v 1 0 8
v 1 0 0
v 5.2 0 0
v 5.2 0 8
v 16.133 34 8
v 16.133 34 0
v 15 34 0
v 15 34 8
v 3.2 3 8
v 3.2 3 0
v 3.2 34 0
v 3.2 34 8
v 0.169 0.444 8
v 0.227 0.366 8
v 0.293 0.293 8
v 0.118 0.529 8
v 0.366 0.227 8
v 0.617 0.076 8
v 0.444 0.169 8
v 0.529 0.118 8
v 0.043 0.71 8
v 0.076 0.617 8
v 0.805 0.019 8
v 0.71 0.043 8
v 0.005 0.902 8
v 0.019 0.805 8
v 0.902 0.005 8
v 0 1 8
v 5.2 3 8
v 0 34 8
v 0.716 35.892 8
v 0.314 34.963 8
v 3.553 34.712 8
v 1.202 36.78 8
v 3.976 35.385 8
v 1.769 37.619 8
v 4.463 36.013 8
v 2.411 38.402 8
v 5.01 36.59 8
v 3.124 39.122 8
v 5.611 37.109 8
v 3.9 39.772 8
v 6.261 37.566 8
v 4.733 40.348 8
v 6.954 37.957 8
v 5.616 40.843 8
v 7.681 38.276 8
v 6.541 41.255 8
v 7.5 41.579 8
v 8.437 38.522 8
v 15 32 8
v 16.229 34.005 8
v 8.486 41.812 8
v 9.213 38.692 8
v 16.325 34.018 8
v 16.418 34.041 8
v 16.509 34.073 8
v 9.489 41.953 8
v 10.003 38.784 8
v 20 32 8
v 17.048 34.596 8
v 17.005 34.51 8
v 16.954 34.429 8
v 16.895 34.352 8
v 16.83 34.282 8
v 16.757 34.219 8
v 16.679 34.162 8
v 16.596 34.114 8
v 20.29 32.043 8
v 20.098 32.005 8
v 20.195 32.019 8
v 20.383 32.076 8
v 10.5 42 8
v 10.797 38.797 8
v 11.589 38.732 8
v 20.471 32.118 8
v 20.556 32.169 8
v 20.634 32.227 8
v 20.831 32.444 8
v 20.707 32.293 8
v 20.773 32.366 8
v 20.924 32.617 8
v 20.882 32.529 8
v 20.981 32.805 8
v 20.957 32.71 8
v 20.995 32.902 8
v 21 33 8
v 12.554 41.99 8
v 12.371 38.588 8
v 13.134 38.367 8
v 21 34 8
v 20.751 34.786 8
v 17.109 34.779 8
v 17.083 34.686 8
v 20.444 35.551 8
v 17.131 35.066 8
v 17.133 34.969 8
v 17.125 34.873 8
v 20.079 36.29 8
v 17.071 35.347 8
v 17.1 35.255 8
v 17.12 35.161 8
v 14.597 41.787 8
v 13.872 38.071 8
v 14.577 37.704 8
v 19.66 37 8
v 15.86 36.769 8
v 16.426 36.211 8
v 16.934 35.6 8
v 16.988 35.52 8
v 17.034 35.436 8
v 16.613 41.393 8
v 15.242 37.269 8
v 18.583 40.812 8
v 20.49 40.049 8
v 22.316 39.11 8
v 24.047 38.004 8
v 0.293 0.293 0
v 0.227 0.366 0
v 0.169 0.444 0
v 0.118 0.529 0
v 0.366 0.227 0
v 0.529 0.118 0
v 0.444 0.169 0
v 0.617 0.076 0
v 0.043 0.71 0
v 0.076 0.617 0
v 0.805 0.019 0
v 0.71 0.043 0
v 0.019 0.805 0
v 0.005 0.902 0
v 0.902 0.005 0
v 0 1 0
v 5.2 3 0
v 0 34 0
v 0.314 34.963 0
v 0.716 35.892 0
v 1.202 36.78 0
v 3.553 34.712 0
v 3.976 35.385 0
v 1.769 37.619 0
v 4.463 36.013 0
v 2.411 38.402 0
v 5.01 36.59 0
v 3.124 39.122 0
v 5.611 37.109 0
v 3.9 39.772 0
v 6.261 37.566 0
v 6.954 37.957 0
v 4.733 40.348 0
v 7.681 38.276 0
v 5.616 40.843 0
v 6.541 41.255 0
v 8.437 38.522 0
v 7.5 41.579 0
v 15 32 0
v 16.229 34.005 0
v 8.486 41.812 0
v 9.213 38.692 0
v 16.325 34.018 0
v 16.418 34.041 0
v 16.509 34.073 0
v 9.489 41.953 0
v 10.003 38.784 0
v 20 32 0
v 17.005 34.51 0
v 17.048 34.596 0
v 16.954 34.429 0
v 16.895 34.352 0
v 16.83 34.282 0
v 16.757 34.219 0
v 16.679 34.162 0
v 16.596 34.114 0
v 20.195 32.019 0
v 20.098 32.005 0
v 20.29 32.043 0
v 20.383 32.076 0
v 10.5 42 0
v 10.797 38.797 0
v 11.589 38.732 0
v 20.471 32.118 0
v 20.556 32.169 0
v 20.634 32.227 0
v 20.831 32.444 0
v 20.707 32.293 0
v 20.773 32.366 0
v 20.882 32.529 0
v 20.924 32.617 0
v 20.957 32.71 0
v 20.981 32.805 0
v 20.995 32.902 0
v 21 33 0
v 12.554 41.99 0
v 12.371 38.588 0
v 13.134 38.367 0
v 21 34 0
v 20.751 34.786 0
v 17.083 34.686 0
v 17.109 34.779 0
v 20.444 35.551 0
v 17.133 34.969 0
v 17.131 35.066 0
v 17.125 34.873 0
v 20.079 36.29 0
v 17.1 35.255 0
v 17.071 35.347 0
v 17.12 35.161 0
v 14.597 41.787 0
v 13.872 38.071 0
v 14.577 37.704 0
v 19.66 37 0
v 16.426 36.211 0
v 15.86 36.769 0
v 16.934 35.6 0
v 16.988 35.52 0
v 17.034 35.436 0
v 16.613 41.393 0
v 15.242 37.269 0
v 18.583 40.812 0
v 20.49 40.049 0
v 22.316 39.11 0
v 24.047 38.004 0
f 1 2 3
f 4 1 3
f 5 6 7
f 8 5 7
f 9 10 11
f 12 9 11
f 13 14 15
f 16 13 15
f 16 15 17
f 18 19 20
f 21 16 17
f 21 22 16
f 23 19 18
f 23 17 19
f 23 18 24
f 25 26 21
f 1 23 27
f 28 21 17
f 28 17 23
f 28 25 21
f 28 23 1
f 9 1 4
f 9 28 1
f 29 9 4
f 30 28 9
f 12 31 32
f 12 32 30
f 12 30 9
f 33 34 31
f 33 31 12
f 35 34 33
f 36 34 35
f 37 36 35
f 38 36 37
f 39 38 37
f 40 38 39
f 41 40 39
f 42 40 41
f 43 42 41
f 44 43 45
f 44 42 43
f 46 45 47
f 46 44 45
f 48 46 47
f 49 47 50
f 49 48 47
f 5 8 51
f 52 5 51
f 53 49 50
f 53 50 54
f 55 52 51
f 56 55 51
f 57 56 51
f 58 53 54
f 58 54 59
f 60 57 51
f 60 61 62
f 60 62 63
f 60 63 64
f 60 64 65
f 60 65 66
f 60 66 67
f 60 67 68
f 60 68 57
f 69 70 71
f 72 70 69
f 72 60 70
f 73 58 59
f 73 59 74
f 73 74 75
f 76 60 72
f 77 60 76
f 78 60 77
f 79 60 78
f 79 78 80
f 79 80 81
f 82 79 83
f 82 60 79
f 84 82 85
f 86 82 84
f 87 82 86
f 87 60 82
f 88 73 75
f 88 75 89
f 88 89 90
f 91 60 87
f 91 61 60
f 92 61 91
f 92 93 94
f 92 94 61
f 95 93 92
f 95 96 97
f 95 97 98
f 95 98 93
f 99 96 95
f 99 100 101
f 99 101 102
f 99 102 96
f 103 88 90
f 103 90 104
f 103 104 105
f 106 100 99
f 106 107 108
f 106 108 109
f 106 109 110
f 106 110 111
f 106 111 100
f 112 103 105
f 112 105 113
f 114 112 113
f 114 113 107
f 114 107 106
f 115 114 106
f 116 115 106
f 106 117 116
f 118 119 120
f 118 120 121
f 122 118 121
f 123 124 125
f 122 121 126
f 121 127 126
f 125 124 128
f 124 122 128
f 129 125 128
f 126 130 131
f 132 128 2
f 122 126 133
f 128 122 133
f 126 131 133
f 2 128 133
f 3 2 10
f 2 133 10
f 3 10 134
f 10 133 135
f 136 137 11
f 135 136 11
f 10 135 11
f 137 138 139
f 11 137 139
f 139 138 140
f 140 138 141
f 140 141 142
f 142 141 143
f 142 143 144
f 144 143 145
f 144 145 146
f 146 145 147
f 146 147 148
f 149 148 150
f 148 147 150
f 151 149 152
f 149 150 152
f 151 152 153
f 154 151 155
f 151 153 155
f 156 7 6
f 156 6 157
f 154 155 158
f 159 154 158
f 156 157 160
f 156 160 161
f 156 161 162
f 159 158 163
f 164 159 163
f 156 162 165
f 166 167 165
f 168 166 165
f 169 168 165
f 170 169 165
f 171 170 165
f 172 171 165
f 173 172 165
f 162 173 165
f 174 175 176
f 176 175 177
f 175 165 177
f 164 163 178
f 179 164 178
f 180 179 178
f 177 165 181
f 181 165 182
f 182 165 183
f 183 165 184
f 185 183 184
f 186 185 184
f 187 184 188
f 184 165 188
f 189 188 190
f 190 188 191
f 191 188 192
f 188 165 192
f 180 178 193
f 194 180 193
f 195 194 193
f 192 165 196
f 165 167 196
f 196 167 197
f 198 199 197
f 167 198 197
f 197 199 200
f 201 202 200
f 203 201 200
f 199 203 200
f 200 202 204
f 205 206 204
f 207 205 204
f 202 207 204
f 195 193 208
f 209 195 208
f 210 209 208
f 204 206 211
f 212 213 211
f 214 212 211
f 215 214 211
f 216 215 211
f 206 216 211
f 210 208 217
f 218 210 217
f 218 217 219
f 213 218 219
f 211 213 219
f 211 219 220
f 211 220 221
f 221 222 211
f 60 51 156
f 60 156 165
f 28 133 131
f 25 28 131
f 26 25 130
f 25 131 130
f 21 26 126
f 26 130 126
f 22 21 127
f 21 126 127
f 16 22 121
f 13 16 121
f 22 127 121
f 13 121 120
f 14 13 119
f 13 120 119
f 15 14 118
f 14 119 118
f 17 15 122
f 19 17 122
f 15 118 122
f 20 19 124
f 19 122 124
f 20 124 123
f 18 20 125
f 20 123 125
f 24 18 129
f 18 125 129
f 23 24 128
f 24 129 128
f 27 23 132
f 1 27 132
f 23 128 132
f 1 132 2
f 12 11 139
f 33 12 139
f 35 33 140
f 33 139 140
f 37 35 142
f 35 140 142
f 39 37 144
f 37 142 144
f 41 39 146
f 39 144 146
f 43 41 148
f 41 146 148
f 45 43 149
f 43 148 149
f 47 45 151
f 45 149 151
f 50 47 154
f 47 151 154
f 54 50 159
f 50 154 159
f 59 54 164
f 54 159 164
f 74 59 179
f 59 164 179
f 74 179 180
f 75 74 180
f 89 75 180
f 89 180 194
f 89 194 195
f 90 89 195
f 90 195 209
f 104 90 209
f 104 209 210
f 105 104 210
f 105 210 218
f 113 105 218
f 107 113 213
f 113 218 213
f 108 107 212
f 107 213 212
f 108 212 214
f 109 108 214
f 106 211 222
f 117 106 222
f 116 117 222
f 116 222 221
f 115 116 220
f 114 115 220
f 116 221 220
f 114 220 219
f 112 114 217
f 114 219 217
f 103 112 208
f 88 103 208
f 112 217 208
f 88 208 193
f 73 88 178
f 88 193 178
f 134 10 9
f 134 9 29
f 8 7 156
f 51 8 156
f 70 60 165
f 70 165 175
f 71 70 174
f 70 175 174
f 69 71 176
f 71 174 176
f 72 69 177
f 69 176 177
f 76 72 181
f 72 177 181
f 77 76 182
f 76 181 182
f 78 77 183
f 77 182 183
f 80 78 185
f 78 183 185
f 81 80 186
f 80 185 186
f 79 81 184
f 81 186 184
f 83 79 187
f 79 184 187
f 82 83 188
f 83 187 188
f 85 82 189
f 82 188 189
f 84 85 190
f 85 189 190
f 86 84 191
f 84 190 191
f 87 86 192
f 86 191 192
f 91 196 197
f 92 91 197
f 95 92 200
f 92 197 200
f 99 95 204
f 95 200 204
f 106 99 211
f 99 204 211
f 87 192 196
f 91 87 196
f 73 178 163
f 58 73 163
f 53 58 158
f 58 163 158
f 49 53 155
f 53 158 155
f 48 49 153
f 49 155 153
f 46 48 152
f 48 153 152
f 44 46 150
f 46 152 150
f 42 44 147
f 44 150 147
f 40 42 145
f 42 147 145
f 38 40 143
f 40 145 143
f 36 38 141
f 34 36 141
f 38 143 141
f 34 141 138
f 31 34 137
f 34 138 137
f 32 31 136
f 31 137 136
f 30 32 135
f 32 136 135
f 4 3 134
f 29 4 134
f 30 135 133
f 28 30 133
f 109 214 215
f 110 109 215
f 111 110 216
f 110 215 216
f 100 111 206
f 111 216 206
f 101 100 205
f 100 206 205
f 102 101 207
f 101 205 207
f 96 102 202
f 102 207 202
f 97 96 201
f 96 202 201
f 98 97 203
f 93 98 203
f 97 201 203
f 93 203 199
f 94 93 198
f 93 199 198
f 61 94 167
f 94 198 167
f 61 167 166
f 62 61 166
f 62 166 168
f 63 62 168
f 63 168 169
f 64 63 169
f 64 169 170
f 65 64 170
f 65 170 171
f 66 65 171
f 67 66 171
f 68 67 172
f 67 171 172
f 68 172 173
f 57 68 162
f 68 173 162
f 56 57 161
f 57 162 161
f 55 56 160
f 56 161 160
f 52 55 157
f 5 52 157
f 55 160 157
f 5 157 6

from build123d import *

# Parameters (mm, degrees)
F0_W     = 2
F0_H     = 3
F1_DEPTH = 8


with BuildPart() as f1:
    # F0 (on Top) → F1 (new body)
    with BuildSketch(Plane.XY):
        with BuildLine():
            ThreePointArc((24.046684, 38.003651), (17.604921, 41.125799), (10.5, 42))
            ThreePointArc((10.5, 42), (15.717908, 40.668619), (19.660035, 37))
            Line((19.660035, 37), (24.046684, 38.003651))
        make_face()
        with BuildLine():
            ThreePointArc((10.5, 42), (3.899811, 39.772124), (0, 34))
            Line((0, 34), (3.2, 34))
            ThreePointArc((3.2, 34), (9.6069, 38.747985), (16.933573, 35.599717))
            ThreePointArc((16.933573, 35.599717), (17.027709, 34.552628), (16.133361, 34))
            Line((16.133361, 34), (15, 34))
            Line((15, 34), (15, 32))
            Line((15, 32), (20, 32))
            ThreePointArc((20, 32), (20.707107, 32.292893), (21, 33))
            Line((21, 33), (21, 34))
            ThreePointArc((21, 34), (20.443805, 35.550823), (19.660035, 37))
            ThreePointArc((19.660035, 37), (15.717908, 40.668619), (10.5, 42))
        make_face()
        with Locations((4.2, 1.5)):
            Rectangle(F0_W, F0_H)
        with BuildLine():
            ThreePointArc((0, 1), (0.292893, 0.292893), (1, 0))
            Line((1, 0), (3.2, 0))
            Line((3.2, 0), (3.2, 3))
            Line((3.2, 3), (3.2, 34))
            Line((3.2, 34), (0, 34))
            Line((0, 34), (0, 1))
        make_face()
    extrude(amount=F1_DEPTH)


solid = f1.part
